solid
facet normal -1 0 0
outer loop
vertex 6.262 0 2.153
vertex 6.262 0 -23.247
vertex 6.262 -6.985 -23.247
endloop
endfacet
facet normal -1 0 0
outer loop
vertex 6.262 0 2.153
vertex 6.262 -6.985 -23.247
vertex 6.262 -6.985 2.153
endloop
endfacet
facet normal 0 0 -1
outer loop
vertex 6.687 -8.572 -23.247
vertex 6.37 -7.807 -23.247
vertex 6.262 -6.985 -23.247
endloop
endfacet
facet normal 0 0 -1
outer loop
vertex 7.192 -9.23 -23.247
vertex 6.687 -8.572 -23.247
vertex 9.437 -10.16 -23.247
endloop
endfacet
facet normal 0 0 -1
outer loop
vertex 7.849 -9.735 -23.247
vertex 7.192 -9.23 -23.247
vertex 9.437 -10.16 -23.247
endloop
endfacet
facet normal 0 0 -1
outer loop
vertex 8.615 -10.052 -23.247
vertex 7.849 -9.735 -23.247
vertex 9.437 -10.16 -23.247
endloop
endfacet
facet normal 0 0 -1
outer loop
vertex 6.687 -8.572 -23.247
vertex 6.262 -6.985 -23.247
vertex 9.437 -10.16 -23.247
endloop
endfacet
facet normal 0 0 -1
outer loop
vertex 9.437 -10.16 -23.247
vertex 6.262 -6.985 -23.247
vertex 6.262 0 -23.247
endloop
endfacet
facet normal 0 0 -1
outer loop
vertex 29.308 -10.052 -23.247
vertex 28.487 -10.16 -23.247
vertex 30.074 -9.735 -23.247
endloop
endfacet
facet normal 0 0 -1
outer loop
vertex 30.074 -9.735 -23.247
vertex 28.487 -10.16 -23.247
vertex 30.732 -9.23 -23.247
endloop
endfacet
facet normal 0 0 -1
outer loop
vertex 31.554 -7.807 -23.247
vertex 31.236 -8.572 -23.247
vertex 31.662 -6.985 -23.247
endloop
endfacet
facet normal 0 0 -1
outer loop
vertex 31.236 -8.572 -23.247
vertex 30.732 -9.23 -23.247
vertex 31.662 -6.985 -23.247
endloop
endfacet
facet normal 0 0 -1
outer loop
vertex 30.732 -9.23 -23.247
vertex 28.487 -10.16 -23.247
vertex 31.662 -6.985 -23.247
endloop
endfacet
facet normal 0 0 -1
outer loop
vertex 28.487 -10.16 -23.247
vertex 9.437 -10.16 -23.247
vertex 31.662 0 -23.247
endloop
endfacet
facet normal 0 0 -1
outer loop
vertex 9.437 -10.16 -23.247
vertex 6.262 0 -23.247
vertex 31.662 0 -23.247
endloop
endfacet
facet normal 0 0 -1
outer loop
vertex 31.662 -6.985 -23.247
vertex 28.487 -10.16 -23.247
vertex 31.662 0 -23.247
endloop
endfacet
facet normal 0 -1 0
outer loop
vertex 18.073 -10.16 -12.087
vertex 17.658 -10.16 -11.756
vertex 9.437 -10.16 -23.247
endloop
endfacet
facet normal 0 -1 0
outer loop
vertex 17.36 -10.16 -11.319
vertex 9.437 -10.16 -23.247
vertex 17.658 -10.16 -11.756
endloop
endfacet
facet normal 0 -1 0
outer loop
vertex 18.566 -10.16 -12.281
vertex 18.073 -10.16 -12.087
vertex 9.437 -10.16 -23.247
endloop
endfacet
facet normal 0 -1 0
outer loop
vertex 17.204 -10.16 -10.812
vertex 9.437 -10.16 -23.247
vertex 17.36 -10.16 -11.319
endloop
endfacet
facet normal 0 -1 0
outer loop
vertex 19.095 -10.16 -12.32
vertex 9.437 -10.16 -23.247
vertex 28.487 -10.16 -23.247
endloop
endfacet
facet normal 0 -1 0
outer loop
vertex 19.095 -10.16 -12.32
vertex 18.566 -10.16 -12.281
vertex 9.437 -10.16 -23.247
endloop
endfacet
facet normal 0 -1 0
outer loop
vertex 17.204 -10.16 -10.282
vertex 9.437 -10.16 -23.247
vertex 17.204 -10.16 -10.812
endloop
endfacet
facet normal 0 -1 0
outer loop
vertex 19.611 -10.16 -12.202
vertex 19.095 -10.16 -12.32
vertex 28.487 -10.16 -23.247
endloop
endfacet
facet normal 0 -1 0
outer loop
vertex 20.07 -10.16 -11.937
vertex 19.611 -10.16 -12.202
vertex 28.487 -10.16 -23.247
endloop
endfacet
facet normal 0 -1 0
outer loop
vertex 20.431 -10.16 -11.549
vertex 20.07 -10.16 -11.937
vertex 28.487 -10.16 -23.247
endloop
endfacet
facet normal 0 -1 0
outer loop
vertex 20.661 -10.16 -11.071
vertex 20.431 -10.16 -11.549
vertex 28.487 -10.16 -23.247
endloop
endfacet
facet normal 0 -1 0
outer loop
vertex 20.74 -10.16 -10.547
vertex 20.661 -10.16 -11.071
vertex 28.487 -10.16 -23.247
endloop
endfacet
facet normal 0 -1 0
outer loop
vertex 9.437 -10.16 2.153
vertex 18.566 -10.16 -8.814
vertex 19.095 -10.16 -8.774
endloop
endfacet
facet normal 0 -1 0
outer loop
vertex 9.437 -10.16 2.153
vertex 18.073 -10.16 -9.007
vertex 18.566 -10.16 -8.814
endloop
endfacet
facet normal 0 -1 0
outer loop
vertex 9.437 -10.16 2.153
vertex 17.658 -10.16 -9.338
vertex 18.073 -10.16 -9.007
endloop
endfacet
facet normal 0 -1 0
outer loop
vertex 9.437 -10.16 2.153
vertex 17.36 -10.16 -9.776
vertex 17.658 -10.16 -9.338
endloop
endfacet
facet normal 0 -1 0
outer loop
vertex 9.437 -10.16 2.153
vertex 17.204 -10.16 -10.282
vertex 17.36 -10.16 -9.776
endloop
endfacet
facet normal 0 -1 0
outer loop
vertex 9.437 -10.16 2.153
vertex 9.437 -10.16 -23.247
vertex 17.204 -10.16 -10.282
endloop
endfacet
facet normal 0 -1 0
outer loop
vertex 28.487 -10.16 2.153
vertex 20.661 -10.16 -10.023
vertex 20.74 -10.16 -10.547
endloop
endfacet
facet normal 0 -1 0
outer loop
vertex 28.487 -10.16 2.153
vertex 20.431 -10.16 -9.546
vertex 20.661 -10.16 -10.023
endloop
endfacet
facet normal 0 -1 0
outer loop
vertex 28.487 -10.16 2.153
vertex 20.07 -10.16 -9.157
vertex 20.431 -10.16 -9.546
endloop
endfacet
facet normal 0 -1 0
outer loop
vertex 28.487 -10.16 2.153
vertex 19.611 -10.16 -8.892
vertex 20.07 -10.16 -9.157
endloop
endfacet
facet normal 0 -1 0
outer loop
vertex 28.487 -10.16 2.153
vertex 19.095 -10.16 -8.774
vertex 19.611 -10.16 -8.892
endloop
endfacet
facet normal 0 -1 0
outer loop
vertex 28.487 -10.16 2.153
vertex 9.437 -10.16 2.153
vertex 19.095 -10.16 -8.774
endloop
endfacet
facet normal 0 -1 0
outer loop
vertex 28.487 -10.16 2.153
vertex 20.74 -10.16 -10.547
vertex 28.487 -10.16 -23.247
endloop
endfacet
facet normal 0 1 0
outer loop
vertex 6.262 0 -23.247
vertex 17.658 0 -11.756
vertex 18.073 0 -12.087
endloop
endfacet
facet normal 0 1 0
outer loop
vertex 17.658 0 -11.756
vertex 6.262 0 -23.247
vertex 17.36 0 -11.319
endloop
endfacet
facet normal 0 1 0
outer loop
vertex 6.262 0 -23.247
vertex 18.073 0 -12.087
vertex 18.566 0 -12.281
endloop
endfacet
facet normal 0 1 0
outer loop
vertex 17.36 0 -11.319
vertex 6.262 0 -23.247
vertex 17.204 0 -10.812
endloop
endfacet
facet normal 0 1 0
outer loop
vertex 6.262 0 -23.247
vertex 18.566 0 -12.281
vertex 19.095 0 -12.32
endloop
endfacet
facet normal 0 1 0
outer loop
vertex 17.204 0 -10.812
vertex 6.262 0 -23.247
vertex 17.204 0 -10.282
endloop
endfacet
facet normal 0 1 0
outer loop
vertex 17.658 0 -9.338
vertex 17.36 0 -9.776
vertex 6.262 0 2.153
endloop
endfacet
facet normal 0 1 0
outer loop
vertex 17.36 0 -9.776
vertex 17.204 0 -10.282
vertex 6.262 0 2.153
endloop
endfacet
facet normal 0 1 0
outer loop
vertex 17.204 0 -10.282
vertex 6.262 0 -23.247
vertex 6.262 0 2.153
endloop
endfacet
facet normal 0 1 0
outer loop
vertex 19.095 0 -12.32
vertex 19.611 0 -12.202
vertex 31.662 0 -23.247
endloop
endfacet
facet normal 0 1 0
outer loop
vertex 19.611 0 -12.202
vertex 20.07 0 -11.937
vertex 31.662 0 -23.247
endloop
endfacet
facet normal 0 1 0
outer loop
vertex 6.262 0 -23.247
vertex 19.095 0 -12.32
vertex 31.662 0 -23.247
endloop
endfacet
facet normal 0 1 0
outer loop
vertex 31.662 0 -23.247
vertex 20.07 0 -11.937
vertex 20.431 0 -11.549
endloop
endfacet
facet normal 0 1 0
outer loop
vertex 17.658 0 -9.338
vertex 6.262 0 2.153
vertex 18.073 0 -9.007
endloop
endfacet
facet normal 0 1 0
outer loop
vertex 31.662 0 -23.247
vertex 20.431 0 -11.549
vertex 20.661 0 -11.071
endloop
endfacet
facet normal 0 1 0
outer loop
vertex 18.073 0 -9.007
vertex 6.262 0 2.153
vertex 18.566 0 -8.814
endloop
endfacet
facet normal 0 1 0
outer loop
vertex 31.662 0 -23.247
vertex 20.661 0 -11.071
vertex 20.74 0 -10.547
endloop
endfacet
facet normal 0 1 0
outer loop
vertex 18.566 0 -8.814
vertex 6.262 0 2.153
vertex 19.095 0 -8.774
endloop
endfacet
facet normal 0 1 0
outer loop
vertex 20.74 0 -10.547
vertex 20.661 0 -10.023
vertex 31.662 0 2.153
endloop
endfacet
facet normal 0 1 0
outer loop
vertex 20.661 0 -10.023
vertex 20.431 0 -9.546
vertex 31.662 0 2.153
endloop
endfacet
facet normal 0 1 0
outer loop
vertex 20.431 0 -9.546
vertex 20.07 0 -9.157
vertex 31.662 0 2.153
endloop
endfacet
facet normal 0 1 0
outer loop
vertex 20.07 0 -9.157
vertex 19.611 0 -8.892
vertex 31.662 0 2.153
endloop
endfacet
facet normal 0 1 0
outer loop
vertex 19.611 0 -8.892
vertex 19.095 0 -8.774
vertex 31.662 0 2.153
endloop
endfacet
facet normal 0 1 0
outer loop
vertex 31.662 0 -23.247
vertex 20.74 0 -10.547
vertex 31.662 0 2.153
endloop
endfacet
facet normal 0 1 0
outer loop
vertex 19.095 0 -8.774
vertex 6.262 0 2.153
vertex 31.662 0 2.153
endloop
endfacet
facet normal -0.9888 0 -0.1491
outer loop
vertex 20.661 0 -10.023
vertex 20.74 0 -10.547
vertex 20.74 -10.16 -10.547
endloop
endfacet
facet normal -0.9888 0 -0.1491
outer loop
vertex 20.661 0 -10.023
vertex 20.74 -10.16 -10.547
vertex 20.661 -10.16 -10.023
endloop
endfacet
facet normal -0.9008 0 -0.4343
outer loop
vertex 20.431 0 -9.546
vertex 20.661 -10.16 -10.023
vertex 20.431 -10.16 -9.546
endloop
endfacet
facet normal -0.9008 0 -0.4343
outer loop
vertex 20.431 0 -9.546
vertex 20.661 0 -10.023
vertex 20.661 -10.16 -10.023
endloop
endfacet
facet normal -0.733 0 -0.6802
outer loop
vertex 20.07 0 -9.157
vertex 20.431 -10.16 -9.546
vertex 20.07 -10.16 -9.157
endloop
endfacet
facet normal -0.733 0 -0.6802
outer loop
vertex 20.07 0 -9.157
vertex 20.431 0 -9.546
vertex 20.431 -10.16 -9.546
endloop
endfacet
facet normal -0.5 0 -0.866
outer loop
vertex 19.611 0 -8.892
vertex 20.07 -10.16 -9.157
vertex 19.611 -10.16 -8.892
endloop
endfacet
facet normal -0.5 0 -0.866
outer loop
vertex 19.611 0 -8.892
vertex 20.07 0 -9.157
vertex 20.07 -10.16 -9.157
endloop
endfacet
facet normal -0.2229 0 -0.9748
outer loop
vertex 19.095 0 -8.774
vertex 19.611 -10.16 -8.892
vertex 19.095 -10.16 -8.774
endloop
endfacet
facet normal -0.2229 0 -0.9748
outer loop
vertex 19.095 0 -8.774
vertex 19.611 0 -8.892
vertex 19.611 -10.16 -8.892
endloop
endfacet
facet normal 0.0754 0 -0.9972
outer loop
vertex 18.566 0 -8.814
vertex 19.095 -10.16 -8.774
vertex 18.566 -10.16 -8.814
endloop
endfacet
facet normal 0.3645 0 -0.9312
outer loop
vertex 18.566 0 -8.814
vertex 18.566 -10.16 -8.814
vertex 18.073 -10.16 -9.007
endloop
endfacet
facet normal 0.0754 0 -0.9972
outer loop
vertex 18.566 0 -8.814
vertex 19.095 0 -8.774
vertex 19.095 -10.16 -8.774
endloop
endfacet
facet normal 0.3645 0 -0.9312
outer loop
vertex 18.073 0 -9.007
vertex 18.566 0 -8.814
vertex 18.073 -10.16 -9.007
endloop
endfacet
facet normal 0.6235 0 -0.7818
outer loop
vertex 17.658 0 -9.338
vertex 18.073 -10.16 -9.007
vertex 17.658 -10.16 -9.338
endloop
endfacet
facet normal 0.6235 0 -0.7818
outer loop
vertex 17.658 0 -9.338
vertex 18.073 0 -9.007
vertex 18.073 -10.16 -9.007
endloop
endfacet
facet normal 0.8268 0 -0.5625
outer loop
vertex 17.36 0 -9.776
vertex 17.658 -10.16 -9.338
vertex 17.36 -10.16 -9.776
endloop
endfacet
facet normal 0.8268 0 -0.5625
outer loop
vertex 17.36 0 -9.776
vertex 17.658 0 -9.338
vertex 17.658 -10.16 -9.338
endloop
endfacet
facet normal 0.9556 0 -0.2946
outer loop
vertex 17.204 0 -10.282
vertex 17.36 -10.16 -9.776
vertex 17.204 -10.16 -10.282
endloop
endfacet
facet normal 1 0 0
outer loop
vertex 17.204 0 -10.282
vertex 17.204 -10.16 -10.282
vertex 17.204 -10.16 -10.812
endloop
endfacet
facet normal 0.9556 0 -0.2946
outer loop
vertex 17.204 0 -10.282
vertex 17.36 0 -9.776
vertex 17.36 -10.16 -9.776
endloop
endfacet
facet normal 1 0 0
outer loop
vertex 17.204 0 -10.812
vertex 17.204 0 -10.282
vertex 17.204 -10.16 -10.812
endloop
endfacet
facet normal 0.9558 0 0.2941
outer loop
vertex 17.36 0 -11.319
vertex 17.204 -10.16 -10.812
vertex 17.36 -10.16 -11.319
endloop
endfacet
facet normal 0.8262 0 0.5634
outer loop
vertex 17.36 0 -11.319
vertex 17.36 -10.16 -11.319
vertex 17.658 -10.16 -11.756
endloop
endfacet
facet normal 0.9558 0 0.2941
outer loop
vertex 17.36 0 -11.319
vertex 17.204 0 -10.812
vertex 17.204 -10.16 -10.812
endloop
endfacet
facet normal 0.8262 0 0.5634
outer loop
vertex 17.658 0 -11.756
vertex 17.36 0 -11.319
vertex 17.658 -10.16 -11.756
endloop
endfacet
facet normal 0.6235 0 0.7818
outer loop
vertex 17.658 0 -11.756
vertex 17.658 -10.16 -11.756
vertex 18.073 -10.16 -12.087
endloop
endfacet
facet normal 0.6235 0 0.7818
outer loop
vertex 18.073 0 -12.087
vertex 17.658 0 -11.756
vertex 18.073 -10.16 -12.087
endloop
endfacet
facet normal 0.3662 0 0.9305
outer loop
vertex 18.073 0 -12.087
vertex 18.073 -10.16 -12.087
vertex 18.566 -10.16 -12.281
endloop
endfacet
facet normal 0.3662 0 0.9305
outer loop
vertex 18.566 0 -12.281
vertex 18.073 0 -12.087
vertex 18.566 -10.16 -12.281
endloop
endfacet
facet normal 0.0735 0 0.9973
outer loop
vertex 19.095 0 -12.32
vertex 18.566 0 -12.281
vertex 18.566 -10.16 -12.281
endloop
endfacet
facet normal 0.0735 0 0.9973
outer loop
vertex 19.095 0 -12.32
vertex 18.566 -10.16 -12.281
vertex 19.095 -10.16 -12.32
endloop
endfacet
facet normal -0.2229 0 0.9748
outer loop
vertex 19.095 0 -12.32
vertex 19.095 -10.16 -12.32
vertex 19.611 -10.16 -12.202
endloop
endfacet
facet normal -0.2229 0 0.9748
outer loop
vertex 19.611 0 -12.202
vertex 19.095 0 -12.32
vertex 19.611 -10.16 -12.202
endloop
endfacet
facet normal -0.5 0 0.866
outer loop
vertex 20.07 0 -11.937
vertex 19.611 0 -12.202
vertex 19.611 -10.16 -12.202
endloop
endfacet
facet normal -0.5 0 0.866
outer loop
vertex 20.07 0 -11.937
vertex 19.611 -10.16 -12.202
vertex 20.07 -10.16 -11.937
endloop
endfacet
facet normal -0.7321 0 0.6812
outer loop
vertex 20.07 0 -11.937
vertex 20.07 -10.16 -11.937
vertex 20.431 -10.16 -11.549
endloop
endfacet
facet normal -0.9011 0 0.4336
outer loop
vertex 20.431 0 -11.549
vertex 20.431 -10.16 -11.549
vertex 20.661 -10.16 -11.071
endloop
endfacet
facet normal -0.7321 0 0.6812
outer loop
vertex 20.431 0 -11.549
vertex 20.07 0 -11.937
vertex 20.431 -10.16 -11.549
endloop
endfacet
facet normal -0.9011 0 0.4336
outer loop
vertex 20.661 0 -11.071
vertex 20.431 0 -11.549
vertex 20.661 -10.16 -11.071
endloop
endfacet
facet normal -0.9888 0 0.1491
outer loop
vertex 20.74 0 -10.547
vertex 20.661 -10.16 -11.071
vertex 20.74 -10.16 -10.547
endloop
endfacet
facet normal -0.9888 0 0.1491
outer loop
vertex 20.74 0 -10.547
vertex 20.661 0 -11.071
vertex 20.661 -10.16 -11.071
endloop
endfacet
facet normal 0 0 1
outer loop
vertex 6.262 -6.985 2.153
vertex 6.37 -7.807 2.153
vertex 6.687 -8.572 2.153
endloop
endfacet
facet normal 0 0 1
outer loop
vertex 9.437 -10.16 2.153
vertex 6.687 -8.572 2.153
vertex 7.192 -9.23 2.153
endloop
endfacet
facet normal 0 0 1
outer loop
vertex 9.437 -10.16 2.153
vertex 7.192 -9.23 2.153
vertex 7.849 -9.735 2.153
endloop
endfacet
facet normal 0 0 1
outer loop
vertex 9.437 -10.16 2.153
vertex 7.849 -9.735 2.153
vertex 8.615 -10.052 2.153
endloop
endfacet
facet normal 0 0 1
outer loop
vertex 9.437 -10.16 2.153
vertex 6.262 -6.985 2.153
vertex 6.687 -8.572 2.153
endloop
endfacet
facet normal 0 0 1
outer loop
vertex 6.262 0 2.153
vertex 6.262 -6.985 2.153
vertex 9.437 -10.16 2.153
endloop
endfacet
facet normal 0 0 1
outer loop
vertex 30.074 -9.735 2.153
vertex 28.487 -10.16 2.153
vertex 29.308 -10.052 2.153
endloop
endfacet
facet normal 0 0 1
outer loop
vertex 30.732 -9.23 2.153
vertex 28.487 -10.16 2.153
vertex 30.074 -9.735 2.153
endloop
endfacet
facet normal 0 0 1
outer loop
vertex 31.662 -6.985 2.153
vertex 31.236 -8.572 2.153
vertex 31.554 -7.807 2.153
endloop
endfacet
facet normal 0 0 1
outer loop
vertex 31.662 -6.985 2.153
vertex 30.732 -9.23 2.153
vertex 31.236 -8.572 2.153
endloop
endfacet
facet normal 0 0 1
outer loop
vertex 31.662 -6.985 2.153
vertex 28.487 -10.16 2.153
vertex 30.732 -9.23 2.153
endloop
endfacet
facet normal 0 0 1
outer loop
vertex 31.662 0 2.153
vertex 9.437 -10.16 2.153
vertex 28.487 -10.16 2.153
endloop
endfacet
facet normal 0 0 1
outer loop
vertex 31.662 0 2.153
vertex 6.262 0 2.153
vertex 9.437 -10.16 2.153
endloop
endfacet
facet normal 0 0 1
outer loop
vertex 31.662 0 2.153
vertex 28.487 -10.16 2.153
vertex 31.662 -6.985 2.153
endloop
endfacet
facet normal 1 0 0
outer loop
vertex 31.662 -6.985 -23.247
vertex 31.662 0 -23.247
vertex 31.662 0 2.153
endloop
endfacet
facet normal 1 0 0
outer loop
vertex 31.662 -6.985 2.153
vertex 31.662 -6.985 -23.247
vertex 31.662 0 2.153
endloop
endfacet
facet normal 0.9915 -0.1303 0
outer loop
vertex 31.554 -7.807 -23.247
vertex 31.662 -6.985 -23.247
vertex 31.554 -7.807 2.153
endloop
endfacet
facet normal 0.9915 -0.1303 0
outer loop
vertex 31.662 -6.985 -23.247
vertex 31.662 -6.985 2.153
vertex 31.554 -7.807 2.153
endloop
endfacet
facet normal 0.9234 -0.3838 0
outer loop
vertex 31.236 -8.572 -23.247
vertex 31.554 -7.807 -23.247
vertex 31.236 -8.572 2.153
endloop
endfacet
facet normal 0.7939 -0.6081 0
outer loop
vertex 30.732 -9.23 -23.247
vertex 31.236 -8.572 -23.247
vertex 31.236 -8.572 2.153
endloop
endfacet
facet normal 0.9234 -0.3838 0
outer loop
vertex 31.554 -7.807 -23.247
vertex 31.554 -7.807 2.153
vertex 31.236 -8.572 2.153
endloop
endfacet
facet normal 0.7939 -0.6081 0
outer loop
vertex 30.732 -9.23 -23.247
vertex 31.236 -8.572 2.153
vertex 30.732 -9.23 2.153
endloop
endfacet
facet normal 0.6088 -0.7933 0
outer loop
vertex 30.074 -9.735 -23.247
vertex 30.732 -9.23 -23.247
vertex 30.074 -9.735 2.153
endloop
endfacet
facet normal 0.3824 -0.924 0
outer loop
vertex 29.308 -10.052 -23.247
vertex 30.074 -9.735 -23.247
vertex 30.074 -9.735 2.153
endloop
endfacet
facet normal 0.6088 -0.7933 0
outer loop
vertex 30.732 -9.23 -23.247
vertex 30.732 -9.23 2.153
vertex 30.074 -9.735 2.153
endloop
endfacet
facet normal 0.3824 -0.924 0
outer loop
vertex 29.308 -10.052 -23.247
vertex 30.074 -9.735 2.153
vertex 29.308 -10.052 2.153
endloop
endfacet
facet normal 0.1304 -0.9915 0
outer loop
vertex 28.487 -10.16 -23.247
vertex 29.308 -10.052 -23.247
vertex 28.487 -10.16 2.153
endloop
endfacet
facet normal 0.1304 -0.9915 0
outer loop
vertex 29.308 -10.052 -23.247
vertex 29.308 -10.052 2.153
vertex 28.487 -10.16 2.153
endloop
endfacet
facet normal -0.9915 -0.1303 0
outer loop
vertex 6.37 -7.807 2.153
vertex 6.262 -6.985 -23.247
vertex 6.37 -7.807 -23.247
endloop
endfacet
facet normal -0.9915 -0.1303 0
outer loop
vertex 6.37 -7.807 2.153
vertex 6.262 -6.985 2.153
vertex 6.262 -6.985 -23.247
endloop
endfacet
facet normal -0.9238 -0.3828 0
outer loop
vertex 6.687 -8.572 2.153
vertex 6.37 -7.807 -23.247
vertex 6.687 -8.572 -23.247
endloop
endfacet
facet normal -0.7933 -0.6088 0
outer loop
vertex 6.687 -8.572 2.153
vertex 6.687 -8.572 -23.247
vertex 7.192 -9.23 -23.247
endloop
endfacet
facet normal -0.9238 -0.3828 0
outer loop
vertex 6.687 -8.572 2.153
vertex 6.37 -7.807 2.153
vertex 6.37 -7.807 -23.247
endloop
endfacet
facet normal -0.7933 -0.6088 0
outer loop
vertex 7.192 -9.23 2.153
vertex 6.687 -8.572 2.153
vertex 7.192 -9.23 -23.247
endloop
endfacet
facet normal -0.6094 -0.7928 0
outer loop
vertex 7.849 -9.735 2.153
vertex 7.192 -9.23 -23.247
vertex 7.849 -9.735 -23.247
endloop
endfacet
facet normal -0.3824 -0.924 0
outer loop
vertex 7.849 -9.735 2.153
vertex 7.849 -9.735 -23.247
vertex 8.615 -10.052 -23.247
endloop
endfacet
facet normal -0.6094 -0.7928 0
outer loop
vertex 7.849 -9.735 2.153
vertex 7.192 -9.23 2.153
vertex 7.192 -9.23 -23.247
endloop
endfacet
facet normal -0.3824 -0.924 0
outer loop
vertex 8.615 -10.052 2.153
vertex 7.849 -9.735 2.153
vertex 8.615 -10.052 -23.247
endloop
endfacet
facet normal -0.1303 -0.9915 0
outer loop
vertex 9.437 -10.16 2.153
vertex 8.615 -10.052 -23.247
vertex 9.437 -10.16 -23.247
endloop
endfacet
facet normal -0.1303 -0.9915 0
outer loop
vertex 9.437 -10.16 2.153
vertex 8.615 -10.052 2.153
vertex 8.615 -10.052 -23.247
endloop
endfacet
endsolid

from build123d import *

# Parameters (mm, degrees)
F0_W     = 25.4
F0_H     = 25.4
F0_R     = 1.778
F1_DEPTH = 10.16
F2_R     = 3.175


with BuildPart() as f1:
    # F0 (on Front) → F1 (new body)
    with BuildSketch(Plane.XZ):
        with Locations((18.961715, -10.547113)):
            Rectangle(F0_W, F0_H)
        with Locations((18.961715, -10.547113)):
            Circle(F0_R, mode=Mode.SUBTRACT)
    extrude(amount=F1_DEPTH)

    # F2
    f2_edges = [f1.edges().sort_by_distance(p)[0] for p in [
        (6.261715, -10.16, -10.547113),
        (31.661715, -10.16, -10.547113),
    ]]
    fillet(f2_edges, radius=F2_R)


solid = f1.part
